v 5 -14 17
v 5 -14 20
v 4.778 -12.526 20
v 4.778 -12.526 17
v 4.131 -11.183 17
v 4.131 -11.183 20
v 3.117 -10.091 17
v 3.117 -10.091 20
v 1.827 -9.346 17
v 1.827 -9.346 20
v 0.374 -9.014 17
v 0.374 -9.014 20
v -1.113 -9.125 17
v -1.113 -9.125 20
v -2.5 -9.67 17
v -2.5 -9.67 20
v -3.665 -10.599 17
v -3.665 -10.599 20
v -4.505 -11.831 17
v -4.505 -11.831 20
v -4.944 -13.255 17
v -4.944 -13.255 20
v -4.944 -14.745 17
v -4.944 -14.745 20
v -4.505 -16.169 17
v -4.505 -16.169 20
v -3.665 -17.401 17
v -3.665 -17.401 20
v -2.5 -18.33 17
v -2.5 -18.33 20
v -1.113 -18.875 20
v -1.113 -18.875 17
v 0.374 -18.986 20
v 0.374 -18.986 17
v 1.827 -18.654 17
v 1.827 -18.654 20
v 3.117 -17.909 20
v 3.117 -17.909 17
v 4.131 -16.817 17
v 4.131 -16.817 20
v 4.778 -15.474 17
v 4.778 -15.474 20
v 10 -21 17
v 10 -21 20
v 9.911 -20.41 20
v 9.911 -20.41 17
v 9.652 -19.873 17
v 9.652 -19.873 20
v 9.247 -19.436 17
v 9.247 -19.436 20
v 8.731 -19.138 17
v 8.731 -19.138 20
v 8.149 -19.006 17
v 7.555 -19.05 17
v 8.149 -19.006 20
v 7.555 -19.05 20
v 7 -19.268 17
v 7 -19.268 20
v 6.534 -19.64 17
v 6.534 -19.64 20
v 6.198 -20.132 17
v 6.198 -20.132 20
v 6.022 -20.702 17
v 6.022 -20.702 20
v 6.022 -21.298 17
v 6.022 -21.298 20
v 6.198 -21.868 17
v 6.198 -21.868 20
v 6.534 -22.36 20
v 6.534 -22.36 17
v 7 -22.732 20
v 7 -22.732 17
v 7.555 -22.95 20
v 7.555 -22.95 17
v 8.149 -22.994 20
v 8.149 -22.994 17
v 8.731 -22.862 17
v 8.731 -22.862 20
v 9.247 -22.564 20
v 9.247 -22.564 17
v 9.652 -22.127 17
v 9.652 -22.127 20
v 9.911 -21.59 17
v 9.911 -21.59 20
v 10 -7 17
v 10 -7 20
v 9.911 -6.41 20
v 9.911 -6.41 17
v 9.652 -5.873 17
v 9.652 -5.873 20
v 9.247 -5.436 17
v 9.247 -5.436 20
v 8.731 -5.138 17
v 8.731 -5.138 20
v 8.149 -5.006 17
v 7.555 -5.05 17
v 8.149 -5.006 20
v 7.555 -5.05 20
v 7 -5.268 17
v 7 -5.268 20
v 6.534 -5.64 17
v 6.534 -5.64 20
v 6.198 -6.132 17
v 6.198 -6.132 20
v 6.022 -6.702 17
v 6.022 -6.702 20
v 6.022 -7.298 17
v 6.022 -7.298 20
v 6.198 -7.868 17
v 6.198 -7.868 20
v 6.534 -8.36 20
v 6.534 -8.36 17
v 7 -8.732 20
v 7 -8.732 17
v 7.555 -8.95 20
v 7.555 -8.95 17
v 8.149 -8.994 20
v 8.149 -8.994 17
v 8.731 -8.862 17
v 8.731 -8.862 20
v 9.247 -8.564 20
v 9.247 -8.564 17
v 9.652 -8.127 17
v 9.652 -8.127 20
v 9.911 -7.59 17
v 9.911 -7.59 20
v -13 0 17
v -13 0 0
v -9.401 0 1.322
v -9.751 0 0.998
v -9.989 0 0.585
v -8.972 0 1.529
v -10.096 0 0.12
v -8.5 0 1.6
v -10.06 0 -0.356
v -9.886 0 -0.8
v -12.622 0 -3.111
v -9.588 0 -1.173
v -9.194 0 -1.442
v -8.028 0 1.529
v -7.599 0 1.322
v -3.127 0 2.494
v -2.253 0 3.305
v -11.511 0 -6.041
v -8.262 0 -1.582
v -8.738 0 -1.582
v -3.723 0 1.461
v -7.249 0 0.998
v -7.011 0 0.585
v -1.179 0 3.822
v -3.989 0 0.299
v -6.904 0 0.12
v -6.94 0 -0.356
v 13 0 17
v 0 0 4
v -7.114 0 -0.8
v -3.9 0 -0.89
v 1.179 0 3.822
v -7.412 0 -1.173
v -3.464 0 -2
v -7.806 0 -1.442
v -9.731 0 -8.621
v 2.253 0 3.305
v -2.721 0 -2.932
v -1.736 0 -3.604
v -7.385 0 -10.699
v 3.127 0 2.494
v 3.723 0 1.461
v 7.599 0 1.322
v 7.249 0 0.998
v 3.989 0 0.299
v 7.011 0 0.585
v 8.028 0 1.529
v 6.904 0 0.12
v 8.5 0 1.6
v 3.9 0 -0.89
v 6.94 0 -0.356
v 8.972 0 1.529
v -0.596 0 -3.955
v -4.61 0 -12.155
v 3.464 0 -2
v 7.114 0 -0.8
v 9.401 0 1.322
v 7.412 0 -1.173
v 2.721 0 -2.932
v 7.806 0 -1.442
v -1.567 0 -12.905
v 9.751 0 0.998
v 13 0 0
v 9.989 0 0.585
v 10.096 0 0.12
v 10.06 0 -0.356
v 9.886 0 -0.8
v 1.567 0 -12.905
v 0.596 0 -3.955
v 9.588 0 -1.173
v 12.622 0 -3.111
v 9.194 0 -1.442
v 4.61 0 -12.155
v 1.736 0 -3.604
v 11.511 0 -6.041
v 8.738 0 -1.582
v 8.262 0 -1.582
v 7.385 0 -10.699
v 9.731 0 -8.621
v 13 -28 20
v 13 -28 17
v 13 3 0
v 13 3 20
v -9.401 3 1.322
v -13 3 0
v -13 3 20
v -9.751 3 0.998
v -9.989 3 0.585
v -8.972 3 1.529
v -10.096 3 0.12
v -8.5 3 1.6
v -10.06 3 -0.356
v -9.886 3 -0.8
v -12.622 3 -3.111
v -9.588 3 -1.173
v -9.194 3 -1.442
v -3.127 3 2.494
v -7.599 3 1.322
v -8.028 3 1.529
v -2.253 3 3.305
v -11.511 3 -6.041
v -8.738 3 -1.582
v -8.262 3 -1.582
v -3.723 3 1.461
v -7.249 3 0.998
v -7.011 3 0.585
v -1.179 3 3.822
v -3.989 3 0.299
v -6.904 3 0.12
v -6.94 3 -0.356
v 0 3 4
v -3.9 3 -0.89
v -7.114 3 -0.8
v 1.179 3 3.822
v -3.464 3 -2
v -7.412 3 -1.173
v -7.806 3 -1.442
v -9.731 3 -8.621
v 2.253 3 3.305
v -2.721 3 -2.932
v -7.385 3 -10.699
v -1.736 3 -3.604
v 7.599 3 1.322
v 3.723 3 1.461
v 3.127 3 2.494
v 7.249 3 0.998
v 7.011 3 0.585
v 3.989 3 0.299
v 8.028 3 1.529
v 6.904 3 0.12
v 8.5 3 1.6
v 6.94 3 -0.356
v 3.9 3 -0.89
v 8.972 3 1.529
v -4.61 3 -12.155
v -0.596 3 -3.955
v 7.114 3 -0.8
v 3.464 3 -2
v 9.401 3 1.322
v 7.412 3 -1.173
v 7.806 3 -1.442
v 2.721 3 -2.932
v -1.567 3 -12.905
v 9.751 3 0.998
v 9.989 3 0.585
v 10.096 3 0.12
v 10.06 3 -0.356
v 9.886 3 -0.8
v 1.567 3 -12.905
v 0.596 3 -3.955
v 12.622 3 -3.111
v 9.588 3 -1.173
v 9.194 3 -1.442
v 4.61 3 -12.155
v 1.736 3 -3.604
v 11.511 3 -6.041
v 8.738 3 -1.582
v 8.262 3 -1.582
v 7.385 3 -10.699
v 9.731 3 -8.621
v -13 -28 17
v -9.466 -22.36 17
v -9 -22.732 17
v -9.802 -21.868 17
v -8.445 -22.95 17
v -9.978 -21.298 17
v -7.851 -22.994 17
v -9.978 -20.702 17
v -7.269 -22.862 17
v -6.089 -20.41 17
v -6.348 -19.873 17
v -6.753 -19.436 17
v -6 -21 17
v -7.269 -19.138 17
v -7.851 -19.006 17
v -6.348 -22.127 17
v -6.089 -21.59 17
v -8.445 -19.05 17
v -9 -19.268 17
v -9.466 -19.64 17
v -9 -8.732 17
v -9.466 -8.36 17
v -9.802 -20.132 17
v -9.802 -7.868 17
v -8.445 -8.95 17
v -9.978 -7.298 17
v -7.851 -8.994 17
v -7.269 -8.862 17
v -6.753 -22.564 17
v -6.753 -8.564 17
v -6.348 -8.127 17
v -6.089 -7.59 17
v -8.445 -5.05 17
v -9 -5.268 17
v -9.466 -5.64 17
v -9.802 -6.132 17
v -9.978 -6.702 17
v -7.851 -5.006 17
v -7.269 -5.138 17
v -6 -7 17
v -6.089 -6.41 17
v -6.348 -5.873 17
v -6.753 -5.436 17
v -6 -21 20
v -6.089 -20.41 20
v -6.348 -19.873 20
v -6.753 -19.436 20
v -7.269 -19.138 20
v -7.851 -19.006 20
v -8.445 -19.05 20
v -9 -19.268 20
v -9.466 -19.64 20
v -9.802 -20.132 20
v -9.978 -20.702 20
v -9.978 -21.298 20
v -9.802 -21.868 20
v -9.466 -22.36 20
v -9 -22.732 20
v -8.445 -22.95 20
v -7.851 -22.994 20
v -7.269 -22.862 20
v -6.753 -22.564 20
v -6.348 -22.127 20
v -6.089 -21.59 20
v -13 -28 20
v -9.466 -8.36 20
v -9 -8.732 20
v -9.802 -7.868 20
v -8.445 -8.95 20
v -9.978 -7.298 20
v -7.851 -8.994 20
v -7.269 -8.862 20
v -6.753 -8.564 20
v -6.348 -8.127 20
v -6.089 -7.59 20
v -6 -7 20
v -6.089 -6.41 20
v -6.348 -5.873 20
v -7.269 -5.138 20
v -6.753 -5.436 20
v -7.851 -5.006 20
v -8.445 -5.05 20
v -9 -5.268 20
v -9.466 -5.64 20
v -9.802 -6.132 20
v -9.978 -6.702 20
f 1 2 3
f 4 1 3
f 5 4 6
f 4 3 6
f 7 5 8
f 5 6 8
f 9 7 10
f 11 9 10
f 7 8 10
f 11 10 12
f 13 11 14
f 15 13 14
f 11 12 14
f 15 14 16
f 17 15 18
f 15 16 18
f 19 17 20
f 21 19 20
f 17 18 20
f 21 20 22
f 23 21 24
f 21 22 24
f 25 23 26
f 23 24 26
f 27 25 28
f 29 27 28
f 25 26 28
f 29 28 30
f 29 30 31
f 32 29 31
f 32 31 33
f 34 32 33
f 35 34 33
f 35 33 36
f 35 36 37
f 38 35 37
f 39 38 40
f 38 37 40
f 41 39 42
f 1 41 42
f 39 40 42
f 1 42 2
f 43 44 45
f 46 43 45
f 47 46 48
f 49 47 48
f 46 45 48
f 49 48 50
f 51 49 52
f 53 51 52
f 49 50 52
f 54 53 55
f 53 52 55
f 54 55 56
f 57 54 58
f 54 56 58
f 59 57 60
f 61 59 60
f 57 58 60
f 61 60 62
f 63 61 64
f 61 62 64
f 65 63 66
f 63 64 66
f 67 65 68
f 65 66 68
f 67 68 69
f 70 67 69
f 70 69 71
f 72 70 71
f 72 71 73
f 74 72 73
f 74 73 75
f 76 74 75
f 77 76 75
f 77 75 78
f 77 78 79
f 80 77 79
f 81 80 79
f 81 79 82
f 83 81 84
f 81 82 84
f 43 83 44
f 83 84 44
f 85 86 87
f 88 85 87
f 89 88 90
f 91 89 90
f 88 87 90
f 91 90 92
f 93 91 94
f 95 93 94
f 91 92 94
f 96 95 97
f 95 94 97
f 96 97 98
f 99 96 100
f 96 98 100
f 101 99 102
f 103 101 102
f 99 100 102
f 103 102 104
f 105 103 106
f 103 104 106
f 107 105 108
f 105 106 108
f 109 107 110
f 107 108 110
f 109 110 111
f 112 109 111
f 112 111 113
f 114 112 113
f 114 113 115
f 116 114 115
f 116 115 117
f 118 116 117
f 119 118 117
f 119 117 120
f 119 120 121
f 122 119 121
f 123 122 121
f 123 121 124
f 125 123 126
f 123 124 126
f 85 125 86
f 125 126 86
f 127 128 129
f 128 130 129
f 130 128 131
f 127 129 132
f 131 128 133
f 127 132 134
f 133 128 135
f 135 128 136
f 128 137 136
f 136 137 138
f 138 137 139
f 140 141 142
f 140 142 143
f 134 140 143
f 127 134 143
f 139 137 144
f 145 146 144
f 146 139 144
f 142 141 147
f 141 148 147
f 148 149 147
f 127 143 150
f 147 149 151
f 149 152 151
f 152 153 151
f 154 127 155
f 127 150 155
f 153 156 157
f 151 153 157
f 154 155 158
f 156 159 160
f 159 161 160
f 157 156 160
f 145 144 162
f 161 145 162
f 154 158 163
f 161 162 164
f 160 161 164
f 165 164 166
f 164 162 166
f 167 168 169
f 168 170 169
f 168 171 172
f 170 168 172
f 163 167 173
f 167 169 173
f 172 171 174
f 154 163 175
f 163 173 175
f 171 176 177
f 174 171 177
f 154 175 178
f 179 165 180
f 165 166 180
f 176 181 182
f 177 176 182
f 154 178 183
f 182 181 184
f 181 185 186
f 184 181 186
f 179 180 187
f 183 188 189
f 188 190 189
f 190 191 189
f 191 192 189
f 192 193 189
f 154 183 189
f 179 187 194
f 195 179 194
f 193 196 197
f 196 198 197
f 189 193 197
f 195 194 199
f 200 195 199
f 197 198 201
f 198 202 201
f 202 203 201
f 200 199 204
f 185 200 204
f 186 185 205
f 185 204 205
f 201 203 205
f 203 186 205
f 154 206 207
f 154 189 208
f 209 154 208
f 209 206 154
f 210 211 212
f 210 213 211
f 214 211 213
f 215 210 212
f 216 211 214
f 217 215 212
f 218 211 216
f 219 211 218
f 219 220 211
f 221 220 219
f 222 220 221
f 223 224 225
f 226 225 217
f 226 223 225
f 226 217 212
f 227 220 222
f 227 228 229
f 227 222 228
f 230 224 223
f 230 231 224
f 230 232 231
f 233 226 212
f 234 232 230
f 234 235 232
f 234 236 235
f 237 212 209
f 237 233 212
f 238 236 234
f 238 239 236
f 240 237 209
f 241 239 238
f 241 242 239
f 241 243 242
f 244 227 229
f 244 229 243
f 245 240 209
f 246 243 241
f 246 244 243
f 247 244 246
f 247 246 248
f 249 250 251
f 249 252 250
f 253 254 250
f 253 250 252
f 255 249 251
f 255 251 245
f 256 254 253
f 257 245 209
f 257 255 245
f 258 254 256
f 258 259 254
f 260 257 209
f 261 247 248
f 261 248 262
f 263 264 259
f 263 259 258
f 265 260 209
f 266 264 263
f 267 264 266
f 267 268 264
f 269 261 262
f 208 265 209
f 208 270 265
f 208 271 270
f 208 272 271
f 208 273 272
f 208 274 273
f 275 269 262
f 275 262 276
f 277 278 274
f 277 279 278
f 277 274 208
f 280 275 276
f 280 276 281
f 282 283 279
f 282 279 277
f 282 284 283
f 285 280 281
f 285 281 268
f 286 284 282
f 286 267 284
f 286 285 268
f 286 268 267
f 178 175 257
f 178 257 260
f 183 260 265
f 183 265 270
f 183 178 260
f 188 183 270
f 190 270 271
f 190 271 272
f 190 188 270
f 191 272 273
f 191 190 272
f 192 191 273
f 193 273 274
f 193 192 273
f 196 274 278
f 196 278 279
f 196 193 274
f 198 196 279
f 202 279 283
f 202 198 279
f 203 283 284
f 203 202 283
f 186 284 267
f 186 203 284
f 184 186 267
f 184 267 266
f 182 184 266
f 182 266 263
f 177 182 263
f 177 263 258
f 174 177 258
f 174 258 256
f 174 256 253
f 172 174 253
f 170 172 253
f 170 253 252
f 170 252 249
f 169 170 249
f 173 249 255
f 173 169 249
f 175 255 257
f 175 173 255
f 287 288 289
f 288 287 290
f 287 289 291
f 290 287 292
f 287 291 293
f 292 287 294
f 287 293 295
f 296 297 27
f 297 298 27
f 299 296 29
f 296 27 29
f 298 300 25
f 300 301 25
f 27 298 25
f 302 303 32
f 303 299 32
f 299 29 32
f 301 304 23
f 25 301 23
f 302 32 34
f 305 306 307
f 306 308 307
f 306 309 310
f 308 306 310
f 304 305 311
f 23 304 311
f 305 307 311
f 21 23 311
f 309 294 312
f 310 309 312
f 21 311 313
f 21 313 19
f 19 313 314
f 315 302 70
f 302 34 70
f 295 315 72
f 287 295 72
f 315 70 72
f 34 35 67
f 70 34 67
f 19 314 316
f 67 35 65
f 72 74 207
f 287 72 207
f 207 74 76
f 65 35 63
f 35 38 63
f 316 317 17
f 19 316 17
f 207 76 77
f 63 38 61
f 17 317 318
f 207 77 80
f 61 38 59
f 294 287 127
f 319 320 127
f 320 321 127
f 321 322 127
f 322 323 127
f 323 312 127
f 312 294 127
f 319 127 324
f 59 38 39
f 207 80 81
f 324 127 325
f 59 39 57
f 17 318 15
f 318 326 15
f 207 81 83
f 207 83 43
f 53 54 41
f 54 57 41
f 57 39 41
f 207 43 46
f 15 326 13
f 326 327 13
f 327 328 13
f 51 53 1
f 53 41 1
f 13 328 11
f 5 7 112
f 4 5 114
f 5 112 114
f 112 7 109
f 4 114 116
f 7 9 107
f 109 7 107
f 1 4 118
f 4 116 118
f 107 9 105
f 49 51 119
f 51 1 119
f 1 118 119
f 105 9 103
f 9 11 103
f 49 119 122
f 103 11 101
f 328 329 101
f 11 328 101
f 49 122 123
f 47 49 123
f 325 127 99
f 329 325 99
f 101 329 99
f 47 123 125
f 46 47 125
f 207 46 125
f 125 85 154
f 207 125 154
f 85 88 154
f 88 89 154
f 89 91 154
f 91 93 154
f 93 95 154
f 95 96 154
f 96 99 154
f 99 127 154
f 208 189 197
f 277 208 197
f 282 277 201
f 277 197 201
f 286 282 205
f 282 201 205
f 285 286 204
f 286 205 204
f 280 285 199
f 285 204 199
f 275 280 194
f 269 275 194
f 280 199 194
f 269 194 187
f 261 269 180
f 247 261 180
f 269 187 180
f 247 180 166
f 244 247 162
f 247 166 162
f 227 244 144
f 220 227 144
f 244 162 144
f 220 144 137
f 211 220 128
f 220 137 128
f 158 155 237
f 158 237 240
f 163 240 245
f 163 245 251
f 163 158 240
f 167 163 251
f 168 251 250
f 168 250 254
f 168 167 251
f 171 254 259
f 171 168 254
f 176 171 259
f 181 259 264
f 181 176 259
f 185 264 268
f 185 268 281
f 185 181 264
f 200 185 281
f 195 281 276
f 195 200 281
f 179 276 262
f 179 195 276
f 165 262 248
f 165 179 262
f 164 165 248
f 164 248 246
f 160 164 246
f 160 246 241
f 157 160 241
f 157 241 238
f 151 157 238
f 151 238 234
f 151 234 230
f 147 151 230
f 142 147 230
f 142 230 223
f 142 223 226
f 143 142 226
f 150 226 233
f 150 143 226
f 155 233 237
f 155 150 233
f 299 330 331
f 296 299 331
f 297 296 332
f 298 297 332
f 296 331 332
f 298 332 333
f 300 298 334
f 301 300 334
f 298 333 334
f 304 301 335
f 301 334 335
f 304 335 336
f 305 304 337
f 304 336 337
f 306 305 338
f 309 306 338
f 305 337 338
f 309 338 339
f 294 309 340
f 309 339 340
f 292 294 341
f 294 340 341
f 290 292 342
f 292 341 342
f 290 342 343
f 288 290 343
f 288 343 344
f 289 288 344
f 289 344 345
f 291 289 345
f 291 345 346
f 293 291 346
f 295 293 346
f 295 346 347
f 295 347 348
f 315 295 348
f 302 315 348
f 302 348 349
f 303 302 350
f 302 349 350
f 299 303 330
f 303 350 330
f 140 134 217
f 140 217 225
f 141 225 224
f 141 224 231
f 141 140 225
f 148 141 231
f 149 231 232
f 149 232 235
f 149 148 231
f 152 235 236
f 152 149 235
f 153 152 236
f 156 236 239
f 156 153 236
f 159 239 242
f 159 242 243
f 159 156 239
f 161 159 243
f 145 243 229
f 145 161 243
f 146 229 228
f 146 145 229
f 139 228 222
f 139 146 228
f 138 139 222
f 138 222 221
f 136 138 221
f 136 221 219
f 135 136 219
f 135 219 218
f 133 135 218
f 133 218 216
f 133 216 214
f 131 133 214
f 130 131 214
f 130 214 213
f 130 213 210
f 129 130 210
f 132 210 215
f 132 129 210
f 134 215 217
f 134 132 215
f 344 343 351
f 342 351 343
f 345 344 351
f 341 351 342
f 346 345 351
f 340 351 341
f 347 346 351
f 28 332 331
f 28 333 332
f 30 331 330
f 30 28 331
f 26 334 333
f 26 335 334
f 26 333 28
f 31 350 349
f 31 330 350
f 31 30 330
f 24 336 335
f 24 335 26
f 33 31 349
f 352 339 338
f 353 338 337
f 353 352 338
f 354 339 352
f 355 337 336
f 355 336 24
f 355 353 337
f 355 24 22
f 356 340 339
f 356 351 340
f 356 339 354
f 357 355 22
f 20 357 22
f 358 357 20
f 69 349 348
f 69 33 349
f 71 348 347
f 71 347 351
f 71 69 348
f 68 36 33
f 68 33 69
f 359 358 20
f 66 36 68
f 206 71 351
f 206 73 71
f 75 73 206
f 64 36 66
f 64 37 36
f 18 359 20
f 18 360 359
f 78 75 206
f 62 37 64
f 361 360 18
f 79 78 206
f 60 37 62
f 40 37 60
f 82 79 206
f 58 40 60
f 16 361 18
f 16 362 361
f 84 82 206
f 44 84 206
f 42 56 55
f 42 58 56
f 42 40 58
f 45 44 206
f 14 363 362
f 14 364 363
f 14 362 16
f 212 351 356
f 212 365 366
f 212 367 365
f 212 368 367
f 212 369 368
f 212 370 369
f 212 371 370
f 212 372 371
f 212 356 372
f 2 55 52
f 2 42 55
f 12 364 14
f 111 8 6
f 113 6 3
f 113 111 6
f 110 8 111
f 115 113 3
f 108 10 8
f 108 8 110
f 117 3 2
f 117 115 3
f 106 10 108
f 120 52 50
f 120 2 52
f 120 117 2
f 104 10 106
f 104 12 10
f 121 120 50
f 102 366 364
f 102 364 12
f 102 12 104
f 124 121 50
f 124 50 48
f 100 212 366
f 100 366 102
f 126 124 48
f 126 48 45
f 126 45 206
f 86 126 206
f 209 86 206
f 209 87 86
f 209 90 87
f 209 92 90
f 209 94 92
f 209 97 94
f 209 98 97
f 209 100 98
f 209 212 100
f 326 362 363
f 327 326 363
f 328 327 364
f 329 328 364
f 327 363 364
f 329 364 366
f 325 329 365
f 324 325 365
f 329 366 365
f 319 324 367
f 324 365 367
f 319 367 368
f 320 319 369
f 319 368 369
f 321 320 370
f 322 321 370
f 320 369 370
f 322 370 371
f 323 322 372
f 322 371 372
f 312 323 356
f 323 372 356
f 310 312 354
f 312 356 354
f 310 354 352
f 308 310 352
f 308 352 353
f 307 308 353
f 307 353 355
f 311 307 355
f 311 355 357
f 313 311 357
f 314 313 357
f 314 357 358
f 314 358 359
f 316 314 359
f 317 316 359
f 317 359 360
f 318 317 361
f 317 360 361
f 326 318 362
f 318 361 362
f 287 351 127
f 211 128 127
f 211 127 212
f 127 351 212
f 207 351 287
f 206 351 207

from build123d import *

# Parameters (mm, degrees)
SKETCH_1_R      = 4
SKETCH_1_R_2    = 1.6
EXTRUDE_1_DEPTH = 3
SKETCH_3_W      = 26
SKETCH_3_H      = 31
SKETCH_3_R      = 5
SKETCH_3_R_2    = 2
EXTRUDE_2_DEPTH = 3


with BuildPart() as part:
    # 草图1 → 凸台-拉伸1 (new body)
    with BuildSketch(Plane(origin=(0, 0, 0), x_dir=(1, 0, 0), z_dir=(0, 1, 0))):
        with BuildLine():
            Line((-13, 0), (-13, -20))
            Line((-13, -20), (13, -20))
            Line((13, -20), (13, 0))
            ThreePointArc((13, 0), (0, 13), (-13, 0))
        make_face()
        with Locations(Location((0, 0, 0), (0, 0, 270))):
            Circle(SKETCH_1_R, mode=Mode.SUBTRACT)
        with Locations(Location((-8.5, 0, 0), (0, 0, 270))):
            Circle(SKETCH_1_R_2, mode=Mode.SUBTRACT)
        with Locations(Location((8.5, 0, 0), (0, 0, 270))):
            Circle(SKETCH_1_R_2, mode=Mode.SUBTRACT)
    extrude(amount=EXTRUDE_1_DEPTH)

    # 草图3 → 凸台-拉伸2 (add)
    with BuildSketch(Plane.XY.offset(20)):
        with Locations((0, -12.5)):
            Rectangle(SKETCH_3_W, SKETCH_3_H)
        with Locations((0, -14)):
            Circle(SKETCH_3_R, mode=Mode.SUBTRACT)
        with Locations((-8, -7)):
            Circle(SKETCH_3_R_2, mode=Mode.SUBTRACT)
        with Locations((8, -7)):
            Circle(SKETCH_3_R_2, mode=Mode.SUBTRACT)
        with Locations((8, -21)):
            Circle(SKETCH_3_R_2, mode=Mode.SUBTRACT)
        with Locations((-8, -21)):
            Circle(SKETCH_3_R_2, mode=Mode.SUBTRACT)
    extrude(amount=-EXTRUDE_2_DEPTH)


solid = part.part
